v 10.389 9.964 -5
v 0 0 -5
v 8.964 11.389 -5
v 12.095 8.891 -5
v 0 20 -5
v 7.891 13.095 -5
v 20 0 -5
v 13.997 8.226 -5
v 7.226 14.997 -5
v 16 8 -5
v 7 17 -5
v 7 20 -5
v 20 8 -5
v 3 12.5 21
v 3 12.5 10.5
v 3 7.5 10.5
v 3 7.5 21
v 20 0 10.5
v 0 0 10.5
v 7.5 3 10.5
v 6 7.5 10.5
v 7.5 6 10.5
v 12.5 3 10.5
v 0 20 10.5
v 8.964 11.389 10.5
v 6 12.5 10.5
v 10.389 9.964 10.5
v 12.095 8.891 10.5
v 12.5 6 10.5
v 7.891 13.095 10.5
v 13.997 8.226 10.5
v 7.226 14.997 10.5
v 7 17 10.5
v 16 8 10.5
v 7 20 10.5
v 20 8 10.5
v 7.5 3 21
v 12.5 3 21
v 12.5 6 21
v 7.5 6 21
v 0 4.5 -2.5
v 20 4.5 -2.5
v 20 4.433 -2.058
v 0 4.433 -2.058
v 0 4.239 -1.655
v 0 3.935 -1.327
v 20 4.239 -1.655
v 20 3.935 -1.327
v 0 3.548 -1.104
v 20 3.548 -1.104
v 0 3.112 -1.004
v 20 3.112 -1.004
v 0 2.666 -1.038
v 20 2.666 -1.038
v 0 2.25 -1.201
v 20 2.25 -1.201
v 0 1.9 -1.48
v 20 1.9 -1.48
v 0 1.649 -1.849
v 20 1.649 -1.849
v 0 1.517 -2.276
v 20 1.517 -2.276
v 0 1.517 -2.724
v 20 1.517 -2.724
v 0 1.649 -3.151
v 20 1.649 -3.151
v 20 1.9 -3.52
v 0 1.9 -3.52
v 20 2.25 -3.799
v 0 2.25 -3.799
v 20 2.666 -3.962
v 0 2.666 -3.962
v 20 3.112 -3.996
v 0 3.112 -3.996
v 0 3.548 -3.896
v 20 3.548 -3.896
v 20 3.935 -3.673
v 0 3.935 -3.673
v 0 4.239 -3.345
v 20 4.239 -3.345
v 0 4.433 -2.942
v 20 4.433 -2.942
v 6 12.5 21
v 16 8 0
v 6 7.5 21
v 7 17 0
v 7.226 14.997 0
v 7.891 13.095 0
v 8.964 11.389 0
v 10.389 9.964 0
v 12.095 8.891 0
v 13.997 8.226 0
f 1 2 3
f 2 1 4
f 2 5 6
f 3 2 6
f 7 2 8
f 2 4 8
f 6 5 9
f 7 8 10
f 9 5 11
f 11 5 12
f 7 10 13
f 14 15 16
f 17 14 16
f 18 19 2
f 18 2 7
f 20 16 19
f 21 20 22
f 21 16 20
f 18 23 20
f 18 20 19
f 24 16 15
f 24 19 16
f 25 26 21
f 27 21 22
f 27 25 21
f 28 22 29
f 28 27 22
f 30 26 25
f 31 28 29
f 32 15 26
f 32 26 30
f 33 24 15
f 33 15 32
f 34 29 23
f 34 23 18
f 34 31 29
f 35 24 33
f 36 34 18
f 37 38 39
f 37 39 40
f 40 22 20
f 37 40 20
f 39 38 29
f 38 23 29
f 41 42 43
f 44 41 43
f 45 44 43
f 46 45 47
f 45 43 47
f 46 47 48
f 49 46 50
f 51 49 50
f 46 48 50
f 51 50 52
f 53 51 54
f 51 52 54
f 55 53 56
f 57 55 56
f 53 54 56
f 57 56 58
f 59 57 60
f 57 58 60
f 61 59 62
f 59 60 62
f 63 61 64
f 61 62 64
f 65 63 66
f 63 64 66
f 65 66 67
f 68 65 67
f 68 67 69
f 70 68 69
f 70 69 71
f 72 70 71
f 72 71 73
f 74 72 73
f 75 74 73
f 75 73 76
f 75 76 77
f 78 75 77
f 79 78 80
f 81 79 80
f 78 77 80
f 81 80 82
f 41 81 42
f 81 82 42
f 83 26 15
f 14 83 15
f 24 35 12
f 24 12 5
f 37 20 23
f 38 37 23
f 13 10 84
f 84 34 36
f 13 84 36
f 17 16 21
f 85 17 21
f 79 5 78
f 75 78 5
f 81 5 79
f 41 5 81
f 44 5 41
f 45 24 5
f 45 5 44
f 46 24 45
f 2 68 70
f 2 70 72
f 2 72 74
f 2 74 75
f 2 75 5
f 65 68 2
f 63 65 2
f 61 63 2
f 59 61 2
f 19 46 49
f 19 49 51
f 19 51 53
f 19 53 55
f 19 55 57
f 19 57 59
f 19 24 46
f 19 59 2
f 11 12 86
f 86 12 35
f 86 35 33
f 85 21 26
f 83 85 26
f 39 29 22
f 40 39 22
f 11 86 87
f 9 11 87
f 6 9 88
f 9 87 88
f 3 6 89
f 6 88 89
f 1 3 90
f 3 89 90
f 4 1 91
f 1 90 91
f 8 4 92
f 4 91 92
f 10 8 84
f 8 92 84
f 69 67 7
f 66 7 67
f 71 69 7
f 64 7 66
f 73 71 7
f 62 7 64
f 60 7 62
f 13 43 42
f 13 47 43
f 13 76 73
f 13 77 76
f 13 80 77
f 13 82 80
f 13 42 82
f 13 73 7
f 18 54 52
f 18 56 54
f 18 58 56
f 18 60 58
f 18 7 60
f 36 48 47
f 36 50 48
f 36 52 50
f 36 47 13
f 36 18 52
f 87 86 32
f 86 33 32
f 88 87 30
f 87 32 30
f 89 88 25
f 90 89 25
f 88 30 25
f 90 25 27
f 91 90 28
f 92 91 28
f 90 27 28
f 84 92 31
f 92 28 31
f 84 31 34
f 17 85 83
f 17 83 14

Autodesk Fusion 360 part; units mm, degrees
sketch "スケッチ1" plane through (0, 0, 0) normal (0, 0, 1) x (1, 0, 0)
  line L0 (0, 0) -> (20, 0)
  line L1 (20, 0) -> (20, 20)
  line L2 (20, 20) -> (0, 20)
  line L3 (0, 20) -> (0, 0)
extrude "押し出し1" add sketch "スケッチ1" along normal blind 10.5
sketch "スケッチ2" plane through (0, 0, 10.5) normal (0, 0, 1) x (-1, 0, 0)
  line L0 (0, -20) -> (0, 0)
  line L1 (0, 0) -> (-20, 0)
  line L2 (-20, 0) -> (-20, -20)
  line L3 (-20, -20) -> (0, -20)
  line L4 (-7.5, -3) -> (-12.5, -3)
  line L5 (-12.5, -3) -> (-12.5, -6)
  line L6 (-12.5, -6) -> (-7.5, -6)
  line L7 (-7.5, -6) -> (-7.5, -3)
  line L8 (-6, -12.5) -> (-3, -12.5)
  line L9 (-3, -12.5) -> (-3, -7.5)
  line L10 (-3, -7.5) -> (-6, -7.5)
  line L11 (-6, -7.5) -> (-6, -12.5)
  dimension "d3" = 7.5
  dimension "d4" = 3
  dimension "d5" = 7.5
  dimension "d6" = 3
extrude "押し出し2" add sketch "スケッチ2" along normal blind 10.5 contours L4 L5 L6 L7 | L8 L9 L10 L11
sketch "スケッチ4" plane through (0, 0, 0) normal (0, 0, -1) x (1, 0, 0)
  line L0 (0, 0) -> (0, -20)
  line L1 (0, -20) -> (20, -20)
  line L2 (20, -20) -> (20, 0)
  line L3 (20, 0) -> (0, 0)
  line L4 (20, -20) -> (7, -20)
  line L5 (7, -20) -> (7, -8)
  line L6 (7, -8) -> (20, -8)
  line L7 (20, -8) -> (20, -20)
  dimension "d14" = 12
  dimension "d15" = 13
extrude "押し出し4" cut sketch "スケッチ4" against normal blind 18 contours L1 L2 L4 L5 L6 L7
fillet "フィレット1" radius 9 1 edges at (7, 8, 5.25)
extrude "押し出し5" add 1 faces at (11.1548, 2.7882, 0) along direction (0, 0, -1) blind 5
sketch "スケッチ3" plane through (20, 0, 0) normal (1, 0, 0) x (0, 1, 0)
  line L0 (8, 10.5) -> (0, 10.5)
  line L1 (0, 10.5) -> (0, -5)
  circle A0 centre (3, -2.5) radius 1.5
  line L2 (8, -5) -> (8, 10.5)
  line L3 (0, -5) -> (8, -5)
  dimension "d9" = 3
  dimension "d10" = 3
  dimension "d22" = 2.5
extrude "押し出し3" cut sketch "スケッチ3" against normal blind 22 contours A0
